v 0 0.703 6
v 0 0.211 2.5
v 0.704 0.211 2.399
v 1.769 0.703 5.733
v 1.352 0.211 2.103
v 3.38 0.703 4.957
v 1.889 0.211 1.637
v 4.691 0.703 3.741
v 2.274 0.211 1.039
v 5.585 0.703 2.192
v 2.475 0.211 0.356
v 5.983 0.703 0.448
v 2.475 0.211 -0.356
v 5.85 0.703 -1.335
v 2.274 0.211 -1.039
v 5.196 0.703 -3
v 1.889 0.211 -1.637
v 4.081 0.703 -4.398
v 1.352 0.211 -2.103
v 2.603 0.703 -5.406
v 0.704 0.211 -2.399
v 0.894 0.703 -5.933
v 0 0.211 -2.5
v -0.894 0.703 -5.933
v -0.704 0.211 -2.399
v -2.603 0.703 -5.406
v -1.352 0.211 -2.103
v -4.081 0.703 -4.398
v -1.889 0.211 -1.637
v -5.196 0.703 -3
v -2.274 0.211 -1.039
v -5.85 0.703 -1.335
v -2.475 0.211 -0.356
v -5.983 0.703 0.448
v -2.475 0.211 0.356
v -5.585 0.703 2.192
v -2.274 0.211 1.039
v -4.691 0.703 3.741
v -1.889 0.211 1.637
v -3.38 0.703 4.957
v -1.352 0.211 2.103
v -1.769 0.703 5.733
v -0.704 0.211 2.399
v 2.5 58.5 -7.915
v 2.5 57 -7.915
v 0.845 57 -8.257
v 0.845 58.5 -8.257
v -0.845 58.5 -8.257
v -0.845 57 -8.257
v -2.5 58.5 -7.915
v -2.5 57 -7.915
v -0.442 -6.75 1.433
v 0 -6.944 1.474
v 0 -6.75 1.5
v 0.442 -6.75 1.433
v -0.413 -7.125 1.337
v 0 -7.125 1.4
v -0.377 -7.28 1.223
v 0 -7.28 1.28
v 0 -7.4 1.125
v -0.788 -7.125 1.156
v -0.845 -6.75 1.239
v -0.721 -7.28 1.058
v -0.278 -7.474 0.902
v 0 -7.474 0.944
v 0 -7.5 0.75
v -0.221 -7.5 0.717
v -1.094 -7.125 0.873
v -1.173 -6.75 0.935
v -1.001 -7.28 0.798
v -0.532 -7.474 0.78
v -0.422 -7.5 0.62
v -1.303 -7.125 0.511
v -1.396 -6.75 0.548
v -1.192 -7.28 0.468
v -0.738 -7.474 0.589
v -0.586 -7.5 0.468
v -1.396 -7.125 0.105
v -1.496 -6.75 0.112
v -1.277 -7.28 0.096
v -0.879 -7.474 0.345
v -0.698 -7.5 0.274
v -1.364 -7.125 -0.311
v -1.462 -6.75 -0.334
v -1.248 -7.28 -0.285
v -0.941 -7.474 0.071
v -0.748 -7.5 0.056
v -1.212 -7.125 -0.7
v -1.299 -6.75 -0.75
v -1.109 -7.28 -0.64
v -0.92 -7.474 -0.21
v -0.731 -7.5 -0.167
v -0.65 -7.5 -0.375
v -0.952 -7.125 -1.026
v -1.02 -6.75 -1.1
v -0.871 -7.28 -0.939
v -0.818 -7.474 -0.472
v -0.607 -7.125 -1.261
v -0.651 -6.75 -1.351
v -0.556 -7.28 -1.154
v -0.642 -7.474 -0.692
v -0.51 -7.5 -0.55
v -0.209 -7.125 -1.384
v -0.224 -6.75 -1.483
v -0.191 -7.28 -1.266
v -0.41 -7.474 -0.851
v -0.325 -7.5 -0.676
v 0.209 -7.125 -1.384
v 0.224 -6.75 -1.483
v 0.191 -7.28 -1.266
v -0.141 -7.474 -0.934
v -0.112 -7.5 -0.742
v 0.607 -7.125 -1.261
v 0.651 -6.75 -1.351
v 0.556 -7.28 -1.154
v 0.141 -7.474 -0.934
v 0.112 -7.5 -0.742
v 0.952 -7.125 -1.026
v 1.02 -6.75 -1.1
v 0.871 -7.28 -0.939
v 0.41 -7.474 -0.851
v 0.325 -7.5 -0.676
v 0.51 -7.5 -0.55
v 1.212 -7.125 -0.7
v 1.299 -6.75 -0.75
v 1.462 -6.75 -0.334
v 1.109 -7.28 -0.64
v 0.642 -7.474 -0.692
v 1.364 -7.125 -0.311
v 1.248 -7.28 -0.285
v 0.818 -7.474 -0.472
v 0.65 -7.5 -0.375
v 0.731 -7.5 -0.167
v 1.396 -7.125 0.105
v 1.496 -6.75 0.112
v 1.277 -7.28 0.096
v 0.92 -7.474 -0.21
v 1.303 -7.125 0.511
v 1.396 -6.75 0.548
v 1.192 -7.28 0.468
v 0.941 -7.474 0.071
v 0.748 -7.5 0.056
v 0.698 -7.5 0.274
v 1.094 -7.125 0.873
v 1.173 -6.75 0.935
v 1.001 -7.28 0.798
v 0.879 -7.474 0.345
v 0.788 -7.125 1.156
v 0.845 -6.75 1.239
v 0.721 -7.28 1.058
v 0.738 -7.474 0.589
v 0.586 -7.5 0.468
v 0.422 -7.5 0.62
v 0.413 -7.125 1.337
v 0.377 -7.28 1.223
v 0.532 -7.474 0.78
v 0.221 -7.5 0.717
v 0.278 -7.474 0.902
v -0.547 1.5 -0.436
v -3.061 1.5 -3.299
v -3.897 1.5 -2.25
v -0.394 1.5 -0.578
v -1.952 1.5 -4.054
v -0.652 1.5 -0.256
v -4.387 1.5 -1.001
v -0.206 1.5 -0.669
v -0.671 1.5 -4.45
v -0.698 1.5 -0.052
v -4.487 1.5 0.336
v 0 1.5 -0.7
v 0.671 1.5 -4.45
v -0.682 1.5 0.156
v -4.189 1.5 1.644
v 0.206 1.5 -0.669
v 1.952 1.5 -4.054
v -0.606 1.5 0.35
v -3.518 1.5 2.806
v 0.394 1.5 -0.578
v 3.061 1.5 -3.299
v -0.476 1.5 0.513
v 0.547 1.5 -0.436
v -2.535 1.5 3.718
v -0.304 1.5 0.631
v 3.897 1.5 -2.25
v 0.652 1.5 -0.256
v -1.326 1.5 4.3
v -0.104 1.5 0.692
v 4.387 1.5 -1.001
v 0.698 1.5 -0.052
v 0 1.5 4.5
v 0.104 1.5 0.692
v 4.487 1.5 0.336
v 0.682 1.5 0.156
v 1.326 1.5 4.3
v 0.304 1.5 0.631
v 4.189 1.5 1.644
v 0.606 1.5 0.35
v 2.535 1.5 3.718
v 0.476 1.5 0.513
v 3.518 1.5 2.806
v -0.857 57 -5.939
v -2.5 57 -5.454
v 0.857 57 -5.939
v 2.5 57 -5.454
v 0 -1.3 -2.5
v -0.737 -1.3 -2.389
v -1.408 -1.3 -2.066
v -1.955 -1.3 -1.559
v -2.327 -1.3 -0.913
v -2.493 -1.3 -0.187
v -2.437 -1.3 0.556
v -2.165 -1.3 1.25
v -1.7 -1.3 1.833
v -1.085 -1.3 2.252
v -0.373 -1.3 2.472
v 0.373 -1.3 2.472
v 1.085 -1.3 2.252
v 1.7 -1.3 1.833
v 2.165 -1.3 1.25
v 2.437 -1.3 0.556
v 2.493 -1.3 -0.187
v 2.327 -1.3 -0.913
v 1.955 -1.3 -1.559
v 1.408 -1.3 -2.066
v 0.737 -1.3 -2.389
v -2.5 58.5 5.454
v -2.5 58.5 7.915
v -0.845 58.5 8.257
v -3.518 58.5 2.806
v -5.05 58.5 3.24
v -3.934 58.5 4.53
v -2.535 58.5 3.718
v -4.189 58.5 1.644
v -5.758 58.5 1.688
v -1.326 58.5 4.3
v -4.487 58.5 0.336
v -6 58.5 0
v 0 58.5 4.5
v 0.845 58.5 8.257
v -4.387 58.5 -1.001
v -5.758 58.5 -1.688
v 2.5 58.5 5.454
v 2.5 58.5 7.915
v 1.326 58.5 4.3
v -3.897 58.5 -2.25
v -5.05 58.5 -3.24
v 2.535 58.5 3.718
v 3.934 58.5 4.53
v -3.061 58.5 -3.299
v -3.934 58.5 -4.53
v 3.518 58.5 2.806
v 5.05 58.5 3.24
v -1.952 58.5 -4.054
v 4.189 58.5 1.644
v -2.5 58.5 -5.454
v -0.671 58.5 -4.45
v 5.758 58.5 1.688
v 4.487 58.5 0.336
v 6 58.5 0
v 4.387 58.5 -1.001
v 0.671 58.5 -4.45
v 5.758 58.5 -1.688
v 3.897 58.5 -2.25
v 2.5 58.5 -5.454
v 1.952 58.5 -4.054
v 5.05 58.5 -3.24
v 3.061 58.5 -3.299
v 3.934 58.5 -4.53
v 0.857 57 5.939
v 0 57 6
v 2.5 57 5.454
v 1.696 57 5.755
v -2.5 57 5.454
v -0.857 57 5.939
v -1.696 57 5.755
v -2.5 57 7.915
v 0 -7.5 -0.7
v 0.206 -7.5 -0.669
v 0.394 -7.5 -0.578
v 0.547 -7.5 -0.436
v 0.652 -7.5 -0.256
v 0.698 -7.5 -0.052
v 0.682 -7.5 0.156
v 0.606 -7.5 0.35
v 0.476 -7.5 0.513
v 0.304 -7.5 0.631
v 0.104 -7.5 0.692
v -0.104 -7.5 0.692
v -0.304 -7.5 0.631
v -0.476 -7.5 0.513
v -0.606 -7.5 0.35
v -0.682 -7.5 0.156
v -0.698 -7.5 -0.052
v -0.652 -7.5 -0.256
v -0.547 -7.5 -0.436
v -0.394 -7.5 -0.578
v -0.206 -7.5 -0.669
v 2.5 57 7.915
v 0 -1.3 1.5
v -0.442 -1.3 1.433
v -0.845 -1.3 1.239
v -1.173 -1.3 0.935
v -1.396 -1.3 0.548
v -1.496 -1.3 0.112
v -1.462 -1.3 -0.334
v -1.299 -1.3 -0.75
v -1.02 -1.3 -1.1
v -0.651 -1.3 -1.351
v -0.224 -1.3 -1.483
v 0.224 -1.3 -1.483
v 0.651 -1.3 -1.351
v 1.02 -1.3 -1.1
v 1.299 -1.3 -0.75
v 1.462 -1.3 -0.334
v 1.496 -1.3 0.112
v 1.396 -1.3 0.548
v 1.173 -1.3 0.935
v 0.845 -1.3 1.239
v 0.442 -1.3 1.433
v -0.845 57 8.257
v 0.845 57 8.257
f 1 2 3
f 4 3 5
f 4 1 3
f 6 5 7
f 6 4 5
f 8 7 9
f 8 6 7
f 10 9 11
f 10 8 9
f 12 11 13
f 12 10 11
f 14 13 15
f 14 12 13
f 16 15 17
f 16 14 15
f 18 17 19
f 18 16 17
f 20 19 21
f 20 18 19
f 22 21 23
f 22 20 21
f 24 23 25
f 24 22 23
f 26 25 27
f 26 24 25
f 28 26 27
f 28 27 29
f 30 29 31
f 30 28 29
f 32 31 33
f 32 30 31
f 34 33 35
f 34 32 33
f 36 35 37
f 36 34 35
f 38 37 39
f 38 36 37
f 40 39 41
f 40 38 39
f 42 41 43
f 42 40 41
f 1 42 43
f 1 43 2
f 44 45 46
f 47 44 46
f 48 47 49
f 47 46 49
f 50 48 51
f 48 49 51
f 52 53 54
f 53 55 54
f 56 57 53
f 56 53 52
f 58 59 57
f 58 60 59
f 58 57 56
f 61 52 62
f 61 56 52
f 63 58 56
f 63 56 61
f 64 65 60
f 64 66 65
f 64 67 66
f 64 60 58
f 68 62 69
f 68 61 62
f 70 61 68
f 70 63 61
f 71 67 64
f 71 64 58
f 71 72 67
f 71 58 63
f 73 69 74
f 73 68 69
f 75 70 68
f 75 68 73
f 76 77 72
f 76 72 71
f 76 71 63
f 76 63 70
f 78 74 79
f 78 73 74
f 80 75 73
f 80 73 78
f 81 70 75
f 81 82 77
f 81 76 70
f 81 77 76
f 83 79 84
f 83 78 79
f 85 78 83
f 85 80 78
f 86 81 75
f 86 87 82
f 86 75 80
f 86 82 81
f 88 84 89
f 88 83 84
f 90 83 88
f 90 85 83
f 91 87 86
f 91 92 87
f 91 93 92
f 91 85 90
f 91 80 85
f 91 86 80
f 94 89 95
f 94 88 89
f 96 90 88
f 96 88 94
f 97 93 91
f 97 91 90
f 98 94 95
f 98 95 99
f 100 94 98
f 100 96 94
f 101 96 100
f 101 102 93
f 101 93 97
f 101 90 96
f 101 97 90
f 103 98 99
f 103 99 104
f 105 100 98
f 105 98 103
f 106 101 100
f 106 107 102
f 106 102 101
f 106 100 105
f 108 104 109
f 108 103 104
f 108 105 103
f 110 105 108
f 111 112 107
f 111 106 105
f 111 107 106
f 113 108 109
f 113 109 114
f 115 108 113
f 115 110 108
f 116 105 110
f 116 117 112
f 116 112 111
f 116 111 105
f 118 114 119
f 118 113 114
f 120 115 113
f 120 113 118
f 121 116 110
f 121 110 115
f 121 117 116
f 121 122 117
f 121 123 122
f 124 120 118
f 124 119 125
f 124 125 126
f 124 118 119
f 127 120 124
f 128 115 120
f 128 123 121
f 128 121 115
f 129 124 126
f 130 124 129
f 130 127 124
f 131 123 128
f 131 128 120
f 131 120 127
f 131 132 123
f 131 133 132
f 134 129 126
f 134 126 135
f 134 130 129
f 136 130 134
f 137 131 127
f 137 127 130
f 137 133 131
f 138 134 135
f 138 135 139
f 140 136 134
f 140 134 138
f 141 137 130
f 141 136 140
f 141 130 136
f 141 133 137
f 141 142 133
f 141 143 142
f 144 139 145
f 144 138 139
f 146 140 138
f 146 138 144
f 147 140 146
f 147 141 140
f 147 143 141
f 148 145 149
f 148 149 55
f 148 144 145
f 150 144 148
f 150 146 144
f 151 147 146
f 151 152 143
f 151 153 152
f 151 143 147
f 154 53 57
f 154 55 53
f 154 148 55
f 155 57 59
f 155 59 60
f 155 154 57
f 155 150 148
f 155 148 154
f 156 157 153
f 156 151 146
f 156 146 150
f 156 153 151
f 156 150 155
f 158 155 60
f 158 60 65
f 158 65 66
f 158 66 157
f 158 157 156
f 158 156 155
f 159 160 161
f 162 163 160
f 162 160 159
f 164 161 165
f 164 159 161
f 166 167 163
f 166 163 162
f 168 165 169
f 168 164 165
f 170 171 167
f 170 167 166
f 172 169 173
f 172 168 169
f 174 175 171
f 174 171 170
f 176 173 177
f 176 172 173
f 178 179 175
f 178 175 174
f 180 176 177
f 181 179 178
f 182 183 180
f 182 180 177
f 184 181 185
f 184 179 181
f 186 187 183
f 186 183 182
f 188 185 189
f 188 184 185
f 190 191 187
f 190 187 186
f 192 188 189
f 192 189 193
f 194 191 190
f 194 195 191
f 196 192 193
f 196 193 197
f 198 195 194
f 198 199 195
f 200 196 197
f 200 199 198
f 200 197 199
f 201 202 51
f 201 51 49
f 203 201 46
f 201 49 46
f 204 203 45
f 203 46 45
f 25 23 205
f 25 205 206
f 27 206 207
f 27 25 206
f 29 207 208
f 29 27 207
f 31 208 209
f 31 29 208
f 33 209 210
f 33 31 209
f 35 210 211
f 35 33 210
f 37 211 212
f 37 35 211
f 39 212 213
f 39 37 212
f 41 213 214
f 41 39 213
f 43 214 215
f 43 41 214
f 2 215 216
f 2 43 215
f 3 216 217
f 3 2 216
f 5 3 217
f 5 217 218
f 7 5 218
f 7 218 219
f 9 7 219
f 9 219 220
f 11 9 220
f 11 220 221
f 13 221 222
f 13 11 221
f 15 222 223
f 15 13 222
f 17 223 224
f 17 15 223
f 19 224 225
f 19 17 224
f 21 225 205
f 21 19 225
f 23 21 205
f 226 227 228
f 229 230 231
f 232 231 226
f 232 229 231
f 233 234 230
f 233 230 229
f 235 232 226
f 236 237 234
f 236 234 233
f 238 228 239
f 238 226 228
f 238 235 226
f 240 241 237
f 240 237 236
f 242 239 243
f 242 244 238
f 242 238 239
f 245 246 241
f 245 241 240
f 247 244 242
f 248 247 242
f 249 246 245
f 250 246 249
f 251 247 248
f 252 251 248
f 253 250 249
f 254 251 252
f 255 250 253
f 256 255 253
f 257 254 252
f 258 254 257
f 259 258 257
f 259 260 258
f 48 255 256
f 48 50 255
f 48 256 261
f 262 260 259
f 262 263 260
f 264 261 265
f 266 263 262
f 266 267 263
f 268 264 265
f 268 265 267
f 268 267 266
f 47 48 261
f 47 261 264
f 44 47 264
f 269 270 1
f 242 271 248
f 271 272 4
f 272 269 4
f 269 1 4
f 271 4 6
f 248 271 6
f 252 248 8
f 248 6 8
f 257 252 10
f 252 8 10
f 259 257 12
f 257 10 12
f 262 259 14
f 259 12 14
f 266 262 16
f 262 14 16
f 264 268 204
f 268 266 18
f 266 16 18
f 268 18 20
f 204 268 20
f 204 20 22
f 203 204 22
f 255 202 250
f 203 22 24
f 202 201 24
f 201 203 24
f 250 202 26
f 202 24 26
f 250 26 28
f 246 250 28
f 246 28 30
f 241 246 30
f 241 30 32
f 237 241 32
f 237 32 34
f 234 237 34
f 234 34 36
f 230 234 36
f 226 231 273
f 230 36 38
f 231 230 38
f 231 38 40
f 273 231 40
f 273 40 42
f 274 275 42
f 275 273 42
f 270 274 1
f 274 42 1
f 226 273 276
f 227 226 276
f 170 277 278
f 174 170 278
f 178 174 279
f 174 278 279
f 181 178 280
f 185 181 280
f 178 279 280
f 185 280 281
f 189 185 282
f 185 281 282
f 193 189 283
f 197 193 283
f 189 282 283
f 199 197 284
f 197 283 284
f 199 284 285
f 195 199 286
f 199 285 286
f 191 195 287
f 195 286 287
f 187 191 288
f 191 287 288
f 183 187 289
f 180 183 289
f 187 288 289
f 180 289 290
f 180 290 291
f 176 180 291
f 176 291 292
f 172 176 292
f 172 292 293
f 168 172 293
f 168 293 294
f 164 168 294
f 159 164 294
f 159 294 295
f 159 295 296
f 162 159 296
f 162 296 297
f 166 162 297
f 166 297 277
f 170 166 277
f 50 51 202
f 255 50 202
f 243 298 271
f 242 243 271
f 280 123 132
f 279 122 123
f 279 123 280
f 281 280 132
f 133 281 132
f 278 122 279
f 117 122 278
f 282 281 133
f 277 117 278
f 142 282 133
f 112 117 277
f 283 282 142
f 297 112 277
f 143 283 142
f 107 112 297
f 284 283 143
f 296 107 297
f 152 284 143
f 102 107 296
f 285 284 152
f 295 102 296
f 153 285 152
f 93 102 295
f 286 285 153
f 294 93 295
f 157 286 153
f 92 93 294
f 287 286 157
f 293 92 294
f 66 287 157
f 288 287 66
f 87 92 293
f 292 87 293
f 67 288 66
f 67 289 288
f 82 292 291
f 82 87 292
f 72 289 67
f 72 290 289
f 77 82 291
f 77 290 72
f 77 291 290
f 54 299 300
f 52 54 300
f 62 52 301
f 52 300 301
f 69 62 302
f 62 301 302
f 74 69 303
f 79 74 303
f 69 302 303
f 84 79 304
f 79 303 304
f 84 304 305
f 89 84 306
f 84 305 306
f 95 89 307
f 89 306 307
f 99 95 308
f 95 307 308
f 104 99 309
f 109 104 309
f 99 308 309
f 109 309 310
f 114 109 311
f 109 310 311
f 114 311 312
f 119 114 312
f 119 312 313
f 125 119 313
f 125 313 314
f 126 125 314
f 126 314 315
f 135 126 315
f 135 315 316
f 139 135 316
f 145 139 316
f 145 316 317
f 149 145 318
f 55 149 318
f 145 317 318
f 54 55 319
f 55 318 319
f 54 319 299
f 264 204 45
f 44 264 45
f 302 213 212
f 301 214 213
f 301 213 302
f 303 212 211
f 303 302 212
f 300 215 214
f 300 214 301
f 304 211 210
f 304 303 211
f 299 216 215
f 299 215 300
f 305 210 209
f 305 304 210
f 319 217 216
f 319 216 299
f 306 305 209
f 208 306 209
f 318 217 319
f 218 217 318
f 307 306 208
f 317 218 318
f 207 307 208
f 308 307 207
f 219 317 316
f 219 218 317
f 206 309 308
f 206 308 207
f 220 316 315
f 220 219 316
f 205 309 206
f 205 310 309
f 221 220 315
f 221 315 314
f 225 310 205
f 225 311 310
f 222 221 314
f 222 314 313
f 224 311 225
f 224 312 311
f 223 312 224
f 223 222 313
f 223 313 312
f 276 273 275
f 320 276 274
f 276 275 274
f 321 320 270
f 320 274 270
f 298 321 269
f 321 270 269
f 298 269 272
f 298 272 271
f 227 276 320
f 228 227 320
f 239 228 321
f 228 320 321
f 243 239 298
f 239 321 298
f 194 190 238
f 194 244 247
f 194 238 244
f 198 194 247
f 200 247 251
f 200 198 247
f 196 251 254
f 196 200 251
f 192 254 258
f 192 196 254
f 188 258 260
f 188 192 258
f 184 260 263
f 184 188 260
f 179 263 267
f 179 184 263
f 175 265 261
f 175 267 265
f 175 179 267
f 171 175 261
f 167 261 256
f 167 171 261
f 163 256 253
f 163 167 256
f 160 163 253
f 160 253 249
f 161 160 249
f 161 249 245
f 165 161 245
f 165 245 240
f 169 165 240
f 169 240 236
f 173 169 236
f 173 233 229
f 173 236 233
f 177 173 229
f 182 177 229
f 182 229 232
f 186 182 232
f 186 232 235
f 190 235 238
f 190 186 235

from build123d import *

# Parameters (mm, degrees)
SKETCH1_R           = 6
BOSS_EXTRUDE1_DEPTH = 58.5
SHELL1_T            = -1.5
SKETCH3_R           = 2.5
BOSS_EXTRUDE2_DEPTH = 1.3
SKETCH4_R           = 1.5
BOSS_EXTRUDE3_DEPTH = 6.2
SKETCH5_R           = 0.7
CUT_EXTRUDE1_DEPTH  = 67.543219038
FILLET1_R           = 0.75
CHAMFER1_SIZE       = 5
CHAMFER1_SIZE_2     = 0.702704174
BOSS_EXTRUDE4_START = -1.5
BOSS_EXTRUDE4_DEPTH = 1.5


with BuildPart() as part:
    # Sketch1 → Boss-Extrude1 (new body)
    with BuildSketch(Plane(origin=(0, 0, 0), x_dir=(1, 0, 0), z_dir=(0, 1, 0))):
        with Locations(Location((0, 0, 0), (0, 0, 270))):
            Circle(SKETCH1_R)
    extrude(amount=BOSS_EXTRUDE1_DEPTH)

    # Shell1
    shell1_openings = [part.faces().sort_by_distance(p)[0] for p in [
        (0, 58.5, 0),
    ]]
    offset(amount=SHELL1_T, openings=shell1_openings, kind=Kind.INTERSECTION)

    # Sketch3 → Boss-Extrude2 (add)
    with BuildSketch(Plane.XZ):
        with Locations(Location((0, 0, 0), (0, 0, 270))):
            Circle(SKETCH3_R)
    extrude(amount=BOSS_EXTRUDE2_DEPTH)

    # Sketch4 → Boss-Extrude3 (add)
    with BuildSketch(Plane.XZ.offset(1.3)):
        with Locations(Location((0, 0, 0), (0, 0, 90))):
            Circle(SKETCH4_R)
    extrude(amount=BOSS_EXTRUDE3_DEPTH)

    # Sketch5 → Cut-Extrude1 (cut, through all)
    with BuildSketch(Plane.XZ.offset(7.5)):
        with Locations(Location((0, 0, 0), (0, 0, 270))):
            Circle(SKETCH5_R)
    extrude(amount=-CUT_EXTRUDE1_DEPTH, mode=Mode.SUBTRACT)

    # Fillet1
    fillet1_edges = [part.edges().sort_by_distance(p)[0] for p in [
        (0, -7.5, -1.5),
    ]]
    fillet(fillet1_edges, radius=FILLET1_R)

    # Chamfer1
    # the kernel refuses this chamfer: 5, 0.702704174 mm, written as the material it takes off along each edge
    with BuildSketch(Plane(origin=(0, 0, 0), x_dir=(0, 0, 1), z_dir=(-1, 0, 0))) as chamfer1_piece_1_section:
        Polygon((6 - CHAMFER1_SIZE, 0), (6, CHAMFER1_SIZE_2), (6, 0), align=None)
    chamfer1_piece_1 = revolve(axis=Axis((0, 0, 0), (0, 1, 0)), mode=Mode.PRIVATE)
    chamfer1_piece_1 = chamfer1_piece_1 - Plane(origin=(0, 0.432162163, 0), x_dir=(0, 0, -1), z_dir=(0, 1, 0)) * Cylinder(2.5, 24, mode=Mode.PRIVATE)
    add(chamfer1_piece_1, mode=Mode.SUBTRACT)

    # Sketch6 → Boss-Extrude4 (add)
    with BuildSketch(Plane(origin=(0, 58.5, 0), x_dir=(1, 0, 0), z_dir=(0, 1, 0)).offset(BOSS_EXTRUDE4_START)):
        with BuildLine():
            Line((2.5, 5.454356057), (2.5, 7.914543575))
            ThreePointArc((2.5, 7.914543575), (0, 8.3), (-2.5, 7.914543575))
            Line((-2.5, 7.914543575), (-2.5, 5.454356057))
            ThreePointArc((-2.5, 5.454356057), (0, 6), (2.5, 5.454356057))
        make_face()
        with BuildLine():
            Line((-2.5, -5.454356057), (-2.5, -7.914543575))
            ThreePointArc((-2.5, -7.914543575), (0, -8.3), (2.5, -7.914543575))
            Line((2.5, -7.914543575), (2.5, -5.454356057))
            ThreePointArc((2.5, -5.454356057), (0, -6), (-2.5, -5.454356057))
        make_face()
    extrude(amount=BOSS_EXTRUDE4_DEPTH)


solid = part.part
